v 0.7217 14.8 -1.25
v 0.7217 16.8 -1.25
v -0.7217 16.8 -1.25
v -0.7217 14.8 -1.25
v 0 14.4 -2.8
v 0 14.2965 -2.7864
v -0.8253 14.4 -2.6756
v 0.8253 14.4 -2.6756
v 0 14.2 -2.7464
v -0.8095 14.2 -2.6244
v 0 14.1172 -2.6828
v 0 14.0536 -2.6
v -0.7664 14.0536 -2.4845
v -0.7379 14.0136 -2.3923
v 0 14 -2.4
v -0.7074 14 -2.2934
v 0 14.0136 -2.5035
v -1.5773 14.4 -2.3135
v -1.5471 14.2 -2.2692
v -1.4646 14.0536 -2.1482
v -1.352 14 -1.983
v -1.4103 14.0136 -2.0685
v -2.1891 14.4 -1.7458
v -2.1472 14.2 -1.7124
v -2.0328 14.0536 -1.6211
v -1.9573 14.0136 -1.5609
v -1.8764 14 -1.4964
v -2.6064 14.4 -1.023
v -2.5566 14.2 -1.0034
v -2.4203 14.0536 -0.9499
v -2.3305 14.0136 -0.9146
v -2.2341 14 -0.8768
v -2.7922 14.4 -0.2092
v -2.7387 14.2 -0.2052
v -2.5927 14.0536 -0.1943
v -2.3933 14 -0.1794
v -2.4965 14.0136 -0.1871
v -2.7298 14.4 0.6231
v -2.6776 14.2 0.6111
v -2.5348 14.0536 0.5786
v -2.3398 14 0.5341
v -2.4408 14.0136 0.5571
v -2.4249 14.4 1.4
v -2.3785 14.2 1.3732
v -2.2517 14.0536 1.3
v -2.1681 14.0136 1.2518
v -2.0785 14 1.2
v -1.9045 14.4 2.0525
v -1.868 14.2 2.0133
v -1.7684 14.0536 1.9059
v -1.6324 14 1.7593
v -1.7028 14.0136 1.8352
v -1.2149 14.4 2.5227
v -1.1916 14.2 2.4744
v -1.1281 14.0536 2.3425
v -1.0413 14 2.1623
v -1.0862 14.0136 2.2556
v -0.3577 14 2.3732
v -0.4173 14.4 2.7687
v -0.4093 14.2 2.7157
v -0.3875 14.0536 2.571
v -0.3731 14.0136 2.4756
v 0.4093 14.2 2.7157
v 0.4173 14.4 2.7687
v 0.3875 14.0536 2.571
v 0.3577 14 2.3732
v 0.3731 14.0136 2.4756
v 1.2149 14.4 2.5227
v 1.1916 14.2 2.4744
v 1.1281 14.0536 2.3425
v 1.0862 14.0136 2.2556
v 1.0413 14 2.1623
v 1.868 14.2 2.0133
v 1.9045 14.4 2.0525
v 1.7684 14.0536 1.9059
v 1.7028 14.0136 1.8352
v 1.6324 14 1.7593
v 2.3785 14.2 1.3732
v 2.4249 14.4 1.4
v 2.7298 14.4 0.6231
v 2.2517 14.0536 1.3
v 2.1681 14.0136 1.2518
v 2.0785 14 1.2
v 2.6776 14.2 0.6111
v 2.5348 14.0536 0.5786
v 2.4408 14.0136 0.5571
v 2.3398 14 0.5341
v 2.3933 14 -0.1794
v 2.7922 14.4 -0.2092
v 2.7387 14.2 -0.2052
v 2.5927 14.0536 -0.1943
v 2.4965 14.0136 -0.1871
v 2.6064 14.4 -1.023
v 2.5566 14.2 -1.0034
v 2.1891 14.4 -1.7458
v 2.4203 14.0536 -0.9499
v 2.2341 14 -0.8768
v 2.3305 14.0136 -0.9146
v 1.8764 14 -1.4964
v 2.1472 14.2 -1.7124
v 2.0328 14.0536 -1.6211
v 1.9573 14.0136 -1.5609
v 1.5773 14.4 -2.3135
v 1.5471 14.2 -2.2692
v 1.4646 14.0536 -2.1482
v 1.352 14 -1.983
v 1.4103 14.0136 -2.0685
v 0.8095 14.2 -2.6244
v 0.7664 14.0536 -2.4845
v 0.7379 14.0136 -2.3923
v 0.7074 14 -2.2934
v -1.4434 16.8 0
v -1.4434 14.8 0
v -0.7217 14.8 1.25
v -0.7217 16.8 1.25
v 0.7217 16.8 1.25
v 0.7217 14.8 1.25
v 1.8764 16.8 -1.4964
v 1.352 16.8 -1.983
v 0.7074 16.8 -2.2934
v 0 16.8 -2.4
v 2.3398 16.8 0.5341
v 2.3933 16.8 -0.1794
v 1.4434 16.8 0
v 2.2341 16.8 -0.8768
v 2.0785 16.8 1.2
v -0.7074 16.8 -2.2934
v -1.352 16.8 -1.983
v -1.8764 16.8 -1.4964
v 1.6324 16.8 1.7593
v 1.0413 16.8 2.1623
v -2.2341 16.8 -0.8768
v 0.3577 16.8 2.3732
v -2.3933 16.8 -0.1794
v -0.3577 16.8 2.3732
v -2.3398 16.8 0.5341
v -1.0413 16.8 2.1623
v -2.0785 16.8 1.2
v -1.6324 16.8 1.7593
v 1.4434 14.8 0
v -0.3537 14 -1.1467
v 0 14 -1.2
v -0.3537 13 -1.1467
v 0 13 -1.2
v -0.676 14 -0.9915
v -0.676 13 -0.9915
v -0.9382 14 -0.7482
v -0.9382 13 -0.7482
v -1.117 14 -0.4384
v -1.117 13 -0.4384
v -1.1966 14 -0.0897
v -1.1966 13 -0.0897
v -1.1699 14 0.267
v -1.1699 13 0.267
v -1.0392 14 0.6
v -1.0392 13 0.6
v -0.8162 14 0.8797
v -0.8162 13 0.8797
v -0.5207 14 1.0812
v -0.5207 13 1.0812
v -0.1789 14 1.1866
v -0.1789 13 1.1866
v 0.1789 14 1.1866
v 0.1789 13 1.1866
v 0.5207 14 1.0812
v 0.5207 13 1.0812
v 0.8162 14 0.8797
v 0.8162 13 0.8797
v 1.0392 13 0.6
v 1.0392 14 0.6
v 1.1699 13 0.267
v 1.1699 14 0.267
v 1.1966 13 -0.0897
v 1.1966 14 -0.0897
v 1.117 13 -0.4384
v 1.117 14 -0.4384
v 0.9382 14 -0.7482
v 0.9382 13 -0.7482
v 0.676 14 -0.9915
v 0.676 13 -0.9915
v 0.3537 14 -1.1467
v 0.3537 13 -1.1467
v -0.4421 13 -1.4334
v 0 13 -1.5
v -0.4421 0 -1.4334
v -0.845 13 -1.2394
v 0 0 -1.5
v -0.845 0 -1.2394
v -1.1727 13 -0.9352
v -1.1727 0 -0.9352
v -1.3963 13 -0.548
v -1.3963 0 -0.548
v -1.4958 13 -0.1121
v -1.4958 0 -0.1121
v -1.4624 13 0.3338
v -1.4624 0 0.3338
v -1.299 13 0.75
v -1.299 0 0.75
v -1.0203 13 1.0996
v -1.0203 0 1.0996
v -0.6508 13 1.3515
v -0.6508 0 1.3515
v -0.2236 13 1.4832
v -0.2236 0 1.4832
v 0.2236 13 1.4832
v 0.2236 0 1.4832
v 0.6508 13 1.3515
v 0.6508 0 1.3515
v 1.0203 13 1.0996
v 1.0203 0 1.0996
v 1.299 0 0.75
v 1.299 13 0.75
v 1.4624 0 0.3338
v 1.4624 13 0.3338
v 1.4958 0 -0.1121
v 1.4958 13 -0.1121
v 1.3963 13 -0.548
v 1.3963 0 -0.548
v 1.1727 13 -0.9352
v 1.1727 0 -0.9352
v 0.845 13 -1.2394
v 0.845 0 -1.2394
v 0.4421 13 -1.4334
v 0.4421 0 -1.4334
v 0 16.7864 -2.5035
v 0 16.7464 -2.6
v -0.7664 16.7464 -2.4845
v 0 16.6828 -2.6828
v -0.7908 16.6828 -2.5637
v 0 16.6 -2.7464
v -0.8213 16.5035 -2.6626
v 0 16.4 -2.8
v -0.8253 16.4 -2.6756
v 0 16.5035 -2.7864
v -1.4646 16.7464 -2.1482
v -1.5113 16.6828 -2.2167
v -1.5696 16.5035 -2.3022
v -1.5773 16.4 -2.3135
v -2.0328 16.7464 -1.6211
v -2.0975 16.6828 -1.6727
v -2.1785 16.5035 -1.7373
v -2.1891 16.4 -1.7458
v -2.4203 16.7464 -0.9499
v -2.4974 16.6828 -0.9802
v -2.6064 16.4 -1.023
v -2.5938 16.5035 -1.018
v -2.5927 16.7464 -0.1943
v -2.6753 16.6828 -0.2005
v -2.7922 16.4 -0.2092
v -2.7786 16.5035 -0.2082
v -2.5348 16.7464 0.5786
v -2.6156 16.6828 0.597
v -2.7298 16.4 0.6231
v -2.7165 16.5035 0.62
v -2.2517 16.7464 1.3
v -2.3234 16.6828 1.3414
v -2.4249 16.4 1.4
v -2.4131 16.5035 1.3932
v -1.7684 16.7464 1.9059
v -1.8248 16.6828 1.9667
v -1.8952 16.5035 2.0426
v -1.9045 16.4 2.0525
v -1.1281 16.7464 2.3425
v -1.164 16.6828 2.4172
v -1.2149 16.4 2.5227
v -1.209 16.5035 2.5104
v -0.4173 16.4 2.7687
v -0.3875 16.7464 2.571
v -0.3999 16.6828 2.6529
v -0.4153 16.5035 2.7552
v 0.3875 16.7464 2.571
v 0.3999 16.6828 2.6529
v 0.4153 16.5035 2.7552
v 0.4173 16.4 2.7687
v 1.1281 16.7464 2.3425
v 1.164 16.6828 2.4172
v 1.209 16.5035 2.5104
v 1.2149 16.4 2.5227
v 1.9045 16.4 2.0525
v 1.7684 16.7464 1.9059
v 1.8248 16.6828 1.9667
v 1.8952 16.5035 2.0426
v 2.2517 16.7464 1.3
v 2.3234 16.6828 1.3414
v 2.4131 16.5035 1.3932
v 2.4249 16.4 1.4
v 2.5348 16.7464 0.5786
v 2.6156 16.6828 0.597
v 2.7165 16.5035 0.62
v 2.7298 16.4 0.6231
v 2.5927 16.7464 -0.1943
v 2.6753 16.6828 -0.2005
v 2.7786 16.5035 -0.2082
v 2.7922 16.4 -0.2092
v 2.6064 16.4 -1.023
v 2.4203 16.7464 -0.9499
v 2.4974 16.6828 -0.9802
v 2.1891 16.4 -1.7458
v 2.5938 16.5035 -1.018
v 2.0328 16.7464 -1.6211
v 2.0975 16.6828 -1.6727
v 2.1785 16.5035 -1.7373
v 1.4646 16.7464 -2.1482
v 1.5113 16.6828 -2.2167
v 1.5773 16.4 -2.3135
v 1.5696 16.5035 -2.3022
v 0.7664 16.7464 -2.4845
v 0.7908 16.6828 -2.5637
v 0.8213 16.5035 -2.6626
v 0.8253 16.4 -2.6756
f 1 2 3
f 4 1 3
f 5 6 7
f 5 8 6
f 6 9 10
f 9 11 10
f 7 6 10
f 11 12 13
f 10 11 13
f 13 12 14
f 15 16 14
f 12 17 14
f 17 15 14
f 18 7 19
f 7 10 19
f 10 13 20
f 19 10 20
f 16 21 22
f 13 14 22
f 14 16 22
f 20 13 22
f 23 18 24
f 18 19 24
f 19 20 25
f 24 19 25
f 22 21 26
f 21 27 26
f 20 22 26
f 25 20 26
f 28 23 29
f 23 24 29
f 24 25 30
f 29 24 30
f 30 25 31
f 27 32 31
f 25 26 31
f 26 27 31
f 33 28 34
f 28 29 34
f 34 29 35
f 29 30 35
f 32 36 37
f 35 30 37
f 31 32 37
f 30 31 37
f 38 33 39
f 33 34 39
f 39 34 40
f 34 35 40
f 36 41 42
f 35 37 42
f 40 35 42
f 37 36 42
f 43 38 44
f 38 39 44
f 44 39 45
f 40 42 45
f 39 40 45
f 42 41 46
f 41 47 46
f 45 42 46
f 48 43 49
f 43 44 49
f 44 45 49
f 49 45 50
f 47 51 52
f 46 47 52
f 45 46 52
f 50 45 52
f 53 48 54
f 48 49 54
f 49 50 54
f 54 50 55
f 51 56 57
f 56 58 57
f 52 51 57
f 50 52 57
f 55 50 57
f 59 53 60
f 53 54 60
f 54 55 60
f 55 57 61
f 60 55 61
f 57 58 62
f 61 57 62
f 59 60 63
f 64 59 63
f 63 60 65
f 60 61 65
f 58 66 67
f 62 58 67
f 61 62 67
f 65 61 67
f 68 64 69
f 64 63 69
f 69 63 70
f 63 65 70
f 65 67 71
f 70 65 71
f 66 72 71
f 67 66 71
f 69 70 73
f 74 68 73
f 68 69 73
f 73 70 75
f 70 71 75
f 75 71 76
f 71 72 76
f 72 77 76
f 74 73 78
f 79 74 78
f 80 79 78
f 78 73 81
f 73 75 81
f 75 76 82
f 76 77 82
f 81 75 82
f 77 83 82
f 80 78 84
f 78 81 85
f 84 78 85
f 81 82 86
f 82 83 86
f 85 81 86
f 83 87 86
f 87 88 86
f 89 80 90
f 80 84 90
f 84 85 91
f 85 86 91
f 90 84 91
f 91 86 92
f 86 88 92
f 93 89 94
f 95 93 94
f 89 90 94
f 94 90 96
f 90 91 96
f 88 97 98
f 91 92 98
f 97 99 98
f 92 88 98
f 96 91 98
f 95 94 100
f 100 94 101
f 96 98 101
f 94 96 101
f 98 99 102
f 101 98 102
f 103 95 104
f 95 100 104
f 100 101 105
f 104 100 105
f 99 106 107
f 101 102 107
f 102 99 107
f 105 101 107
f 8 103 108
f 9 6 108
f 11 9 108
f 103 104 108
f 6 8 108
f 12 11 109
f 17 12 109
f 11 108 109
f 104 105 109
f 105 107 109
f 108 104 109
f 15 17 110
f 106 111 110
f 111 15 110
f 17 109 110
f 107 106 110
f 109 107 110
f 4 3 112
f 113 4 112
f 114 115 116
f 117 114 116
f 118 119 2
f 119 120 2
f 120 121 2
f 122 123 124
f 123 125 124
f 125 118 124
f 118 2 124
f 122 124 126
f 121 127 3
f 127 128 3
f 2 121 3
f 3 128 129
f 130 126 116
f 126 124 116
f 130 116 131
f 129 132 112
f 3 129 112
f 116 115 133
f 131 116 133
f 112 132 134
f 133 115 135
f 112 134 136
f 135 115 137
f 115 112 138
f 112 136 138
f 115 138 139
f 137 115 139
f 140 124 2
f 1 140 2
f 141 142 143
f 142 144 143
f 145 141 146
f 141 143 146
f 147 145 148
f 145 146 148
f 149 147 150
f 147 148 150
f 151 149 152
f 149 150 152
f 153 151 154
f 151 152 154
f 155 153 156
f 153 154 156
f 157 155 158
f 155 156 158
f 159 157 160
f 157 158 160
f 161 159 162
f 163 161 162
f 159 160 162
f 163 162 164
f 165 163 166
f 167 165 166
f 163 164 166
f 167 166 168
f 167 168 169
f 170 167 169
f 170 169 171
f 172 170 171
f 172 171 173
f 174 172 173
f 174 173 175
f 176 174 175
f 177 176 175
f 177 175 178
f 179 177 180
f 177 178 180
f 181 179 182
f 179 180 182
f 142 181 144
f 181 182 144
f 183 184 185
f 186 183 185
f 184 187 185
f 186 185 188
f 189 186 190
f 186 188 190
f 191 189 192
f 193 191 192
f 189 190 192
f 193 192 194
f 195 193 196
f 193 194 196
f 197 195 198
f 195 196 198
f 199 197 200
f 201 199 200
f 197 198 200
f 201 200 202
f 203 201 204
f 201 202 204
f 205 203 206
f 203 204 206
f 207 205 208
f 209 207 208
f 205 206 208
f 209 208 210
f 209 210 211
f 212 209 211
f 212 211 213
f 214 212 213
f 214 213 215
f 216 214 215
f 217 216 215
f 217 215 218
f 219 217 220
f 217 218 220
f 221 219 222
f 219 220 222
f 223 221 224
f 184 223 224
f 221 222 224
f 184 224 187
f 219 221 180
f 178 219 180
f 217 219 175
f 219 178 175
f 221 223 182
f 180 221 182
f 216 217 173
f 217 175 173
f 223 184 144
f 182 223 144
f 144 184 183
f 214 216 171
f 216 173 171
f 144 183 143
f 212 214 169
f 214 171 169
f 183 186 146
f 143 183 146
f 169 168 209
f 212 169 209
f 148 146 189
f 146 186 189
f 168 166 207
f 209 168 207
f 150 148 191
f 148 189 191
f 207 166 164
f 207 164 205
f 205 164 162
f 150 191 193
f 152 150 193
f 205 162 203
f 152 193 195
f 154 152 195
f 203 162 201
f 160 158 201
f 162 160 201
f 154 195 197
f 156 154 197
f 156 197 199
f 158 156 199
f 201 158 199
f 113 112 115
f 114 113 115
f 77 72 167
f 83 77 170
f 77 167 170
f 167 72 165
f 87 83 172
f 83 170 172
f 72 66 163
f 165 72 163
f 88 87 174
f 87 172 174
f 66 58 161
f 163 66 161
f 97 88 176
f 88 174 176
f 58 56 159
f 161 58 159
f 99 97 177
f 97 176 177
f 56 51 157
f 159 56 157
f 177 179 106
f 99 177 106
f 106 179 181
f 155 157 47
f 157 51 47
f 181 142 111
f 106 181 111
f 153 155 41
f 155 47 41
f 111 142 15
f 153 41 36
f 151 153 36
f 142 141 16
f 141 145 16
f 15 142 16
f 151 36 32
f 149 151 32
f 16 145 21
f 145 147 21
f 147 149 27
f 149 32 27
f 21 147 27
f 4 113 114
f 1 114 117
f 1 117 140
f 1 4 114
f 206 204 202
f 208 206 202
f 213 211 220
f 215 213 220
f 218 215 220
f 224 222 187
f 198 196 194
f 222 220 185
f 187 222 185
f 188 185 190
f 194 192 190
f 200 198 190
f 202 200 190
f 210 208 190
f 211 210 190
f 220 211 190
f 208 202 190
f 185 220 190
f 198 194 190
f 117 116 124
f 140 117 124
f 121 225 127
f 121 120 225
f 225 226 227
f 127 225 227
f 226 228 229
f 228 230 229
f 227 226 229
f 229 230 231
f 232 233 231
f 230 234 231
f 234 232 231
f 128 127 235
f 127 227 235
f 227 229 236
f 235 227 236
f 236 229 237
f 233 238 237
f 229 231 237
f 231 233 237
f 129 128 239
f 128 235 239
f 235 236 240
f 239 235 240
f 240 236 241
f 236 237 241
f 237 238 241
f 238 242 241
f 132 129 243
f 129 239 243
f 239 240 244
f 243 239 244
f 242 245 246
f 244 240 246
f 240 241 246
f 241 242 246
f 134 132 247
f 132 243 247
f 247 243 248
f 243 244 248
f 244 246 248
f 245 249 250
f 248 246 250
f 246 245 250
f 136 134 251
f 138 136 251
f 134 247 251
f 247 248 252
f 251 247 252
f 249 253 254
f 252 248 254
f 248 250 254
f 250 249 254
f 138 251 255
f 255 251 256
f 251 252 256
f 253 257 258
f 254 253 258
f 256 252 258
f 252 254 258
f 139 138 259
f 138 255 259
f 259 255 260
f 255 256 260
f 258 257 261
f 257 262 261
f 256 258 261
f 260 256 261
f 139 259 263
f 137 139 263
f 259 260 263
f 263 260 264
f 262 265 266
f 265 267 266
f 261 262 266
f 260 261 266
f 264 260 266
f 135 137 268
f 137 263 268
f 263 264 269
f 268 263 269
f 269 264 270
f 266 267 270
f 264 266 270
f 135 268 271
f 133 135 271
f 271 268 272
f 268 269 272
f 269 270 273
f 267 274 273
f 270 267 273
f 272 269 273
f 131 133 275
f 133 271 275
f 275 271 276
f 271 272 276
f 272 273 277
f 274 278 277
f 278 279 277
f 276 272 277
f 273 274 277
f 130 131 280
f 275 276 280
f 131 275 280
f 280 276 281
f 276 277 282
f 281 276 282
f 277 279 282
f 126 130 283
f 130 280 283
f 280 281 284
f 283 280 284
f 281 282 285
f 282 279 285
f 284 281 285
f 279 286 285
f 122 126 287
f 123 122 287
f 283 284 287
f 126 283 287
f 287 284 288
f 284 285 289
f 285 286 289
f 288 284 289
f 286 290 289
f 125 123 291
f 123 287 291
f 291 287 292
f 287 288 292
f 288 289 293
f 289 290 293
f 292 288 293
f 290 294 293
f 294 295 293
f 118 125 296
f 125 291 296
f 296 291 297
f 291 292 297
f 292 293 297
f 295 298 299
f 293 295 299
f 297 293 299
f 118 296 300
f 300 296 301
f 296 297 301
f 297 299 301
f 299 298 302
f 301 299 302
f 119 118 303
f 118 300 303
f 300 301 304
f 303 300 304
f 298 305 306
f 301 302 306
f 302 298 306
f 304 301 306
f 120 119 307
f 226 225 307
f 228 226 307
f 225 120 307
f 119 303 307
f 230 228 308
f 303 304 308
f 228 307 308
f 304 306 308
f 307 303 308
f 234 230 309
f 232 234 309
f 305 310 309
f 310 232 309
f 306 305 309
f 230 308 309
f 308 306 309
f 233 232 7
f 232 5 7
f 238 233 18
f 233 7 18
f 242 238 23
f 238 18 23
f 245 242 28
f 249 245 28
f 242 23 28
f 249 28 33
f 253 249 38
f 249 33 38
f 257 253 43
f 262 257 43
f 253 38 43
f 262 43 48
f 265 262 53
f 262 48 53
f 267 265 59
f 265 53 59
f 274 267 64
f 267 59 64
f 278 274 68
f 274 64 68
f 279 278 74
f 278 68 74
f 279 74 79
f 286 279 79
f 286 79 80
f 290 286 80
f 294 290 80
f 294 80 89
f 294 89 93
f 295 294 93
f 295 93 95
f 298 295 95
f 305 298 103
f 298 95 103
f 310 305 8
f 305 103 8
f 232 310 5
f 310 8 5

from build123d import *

# Parameters (mm, degrees)
CUT_EXTRUDE_1_DEPTH = 2


with BuildPart() as part:
    # 草图1 → 旋转1 (revolve)
    with BuildSketch(Plane.XY, mode=Mode.PRIVATE) as revolve_1_sk:
        with BuildLine():
            Line((0, 16.8), (-2.4, 16.8))
            ThreePointArc((-2.4, 16.8), (-2.682842712, 16.682842712), (-2.8, 16.4))
            Line((-2.8, 16.4), (-2.8, 14.4))
            ThreePointArc((-2.8, 14.4), (-2.682842712, 14.117157288), (-2.4, 14))
            Line((-2.4, 14), (-1.2, 14))
            Line((-1.2, 14), (-1.2, 13))
            Line((-1.2, 13), (-1.5, 13))
            Line((-1.5, 13), (-1.5, 0))
            Line((-1.5, 0), (0, 0))
            Line((0, 0), (0, 16.8))
        make_face()
    revolve(revolve_1_sk.sketch.rotate(Axis((0, 0, 0), (0, 1, 0)), 270), axis=Axis((0, 0, 0), (0, 1, 0)))

    # 草图2 → 切除-拉伸1 (cut)
    with BuildSketch(Plane(origin=(0, 16.8, 0), x_dir=(1, 0, 0), z_dir=(0, 1, 0))):
        Polygon((-0.721687836, 1.25), (-1.443375673, 0), (-0.721687836, -1.25), (0.721687836, -1.25), (1.443375673, 0), (0.721687836, 1.25), align=None)
    extrude(amount=-CUT_EXTRUDE_1_DEPTH, mode=Mode.SUBTRACT)


solid = part.part
